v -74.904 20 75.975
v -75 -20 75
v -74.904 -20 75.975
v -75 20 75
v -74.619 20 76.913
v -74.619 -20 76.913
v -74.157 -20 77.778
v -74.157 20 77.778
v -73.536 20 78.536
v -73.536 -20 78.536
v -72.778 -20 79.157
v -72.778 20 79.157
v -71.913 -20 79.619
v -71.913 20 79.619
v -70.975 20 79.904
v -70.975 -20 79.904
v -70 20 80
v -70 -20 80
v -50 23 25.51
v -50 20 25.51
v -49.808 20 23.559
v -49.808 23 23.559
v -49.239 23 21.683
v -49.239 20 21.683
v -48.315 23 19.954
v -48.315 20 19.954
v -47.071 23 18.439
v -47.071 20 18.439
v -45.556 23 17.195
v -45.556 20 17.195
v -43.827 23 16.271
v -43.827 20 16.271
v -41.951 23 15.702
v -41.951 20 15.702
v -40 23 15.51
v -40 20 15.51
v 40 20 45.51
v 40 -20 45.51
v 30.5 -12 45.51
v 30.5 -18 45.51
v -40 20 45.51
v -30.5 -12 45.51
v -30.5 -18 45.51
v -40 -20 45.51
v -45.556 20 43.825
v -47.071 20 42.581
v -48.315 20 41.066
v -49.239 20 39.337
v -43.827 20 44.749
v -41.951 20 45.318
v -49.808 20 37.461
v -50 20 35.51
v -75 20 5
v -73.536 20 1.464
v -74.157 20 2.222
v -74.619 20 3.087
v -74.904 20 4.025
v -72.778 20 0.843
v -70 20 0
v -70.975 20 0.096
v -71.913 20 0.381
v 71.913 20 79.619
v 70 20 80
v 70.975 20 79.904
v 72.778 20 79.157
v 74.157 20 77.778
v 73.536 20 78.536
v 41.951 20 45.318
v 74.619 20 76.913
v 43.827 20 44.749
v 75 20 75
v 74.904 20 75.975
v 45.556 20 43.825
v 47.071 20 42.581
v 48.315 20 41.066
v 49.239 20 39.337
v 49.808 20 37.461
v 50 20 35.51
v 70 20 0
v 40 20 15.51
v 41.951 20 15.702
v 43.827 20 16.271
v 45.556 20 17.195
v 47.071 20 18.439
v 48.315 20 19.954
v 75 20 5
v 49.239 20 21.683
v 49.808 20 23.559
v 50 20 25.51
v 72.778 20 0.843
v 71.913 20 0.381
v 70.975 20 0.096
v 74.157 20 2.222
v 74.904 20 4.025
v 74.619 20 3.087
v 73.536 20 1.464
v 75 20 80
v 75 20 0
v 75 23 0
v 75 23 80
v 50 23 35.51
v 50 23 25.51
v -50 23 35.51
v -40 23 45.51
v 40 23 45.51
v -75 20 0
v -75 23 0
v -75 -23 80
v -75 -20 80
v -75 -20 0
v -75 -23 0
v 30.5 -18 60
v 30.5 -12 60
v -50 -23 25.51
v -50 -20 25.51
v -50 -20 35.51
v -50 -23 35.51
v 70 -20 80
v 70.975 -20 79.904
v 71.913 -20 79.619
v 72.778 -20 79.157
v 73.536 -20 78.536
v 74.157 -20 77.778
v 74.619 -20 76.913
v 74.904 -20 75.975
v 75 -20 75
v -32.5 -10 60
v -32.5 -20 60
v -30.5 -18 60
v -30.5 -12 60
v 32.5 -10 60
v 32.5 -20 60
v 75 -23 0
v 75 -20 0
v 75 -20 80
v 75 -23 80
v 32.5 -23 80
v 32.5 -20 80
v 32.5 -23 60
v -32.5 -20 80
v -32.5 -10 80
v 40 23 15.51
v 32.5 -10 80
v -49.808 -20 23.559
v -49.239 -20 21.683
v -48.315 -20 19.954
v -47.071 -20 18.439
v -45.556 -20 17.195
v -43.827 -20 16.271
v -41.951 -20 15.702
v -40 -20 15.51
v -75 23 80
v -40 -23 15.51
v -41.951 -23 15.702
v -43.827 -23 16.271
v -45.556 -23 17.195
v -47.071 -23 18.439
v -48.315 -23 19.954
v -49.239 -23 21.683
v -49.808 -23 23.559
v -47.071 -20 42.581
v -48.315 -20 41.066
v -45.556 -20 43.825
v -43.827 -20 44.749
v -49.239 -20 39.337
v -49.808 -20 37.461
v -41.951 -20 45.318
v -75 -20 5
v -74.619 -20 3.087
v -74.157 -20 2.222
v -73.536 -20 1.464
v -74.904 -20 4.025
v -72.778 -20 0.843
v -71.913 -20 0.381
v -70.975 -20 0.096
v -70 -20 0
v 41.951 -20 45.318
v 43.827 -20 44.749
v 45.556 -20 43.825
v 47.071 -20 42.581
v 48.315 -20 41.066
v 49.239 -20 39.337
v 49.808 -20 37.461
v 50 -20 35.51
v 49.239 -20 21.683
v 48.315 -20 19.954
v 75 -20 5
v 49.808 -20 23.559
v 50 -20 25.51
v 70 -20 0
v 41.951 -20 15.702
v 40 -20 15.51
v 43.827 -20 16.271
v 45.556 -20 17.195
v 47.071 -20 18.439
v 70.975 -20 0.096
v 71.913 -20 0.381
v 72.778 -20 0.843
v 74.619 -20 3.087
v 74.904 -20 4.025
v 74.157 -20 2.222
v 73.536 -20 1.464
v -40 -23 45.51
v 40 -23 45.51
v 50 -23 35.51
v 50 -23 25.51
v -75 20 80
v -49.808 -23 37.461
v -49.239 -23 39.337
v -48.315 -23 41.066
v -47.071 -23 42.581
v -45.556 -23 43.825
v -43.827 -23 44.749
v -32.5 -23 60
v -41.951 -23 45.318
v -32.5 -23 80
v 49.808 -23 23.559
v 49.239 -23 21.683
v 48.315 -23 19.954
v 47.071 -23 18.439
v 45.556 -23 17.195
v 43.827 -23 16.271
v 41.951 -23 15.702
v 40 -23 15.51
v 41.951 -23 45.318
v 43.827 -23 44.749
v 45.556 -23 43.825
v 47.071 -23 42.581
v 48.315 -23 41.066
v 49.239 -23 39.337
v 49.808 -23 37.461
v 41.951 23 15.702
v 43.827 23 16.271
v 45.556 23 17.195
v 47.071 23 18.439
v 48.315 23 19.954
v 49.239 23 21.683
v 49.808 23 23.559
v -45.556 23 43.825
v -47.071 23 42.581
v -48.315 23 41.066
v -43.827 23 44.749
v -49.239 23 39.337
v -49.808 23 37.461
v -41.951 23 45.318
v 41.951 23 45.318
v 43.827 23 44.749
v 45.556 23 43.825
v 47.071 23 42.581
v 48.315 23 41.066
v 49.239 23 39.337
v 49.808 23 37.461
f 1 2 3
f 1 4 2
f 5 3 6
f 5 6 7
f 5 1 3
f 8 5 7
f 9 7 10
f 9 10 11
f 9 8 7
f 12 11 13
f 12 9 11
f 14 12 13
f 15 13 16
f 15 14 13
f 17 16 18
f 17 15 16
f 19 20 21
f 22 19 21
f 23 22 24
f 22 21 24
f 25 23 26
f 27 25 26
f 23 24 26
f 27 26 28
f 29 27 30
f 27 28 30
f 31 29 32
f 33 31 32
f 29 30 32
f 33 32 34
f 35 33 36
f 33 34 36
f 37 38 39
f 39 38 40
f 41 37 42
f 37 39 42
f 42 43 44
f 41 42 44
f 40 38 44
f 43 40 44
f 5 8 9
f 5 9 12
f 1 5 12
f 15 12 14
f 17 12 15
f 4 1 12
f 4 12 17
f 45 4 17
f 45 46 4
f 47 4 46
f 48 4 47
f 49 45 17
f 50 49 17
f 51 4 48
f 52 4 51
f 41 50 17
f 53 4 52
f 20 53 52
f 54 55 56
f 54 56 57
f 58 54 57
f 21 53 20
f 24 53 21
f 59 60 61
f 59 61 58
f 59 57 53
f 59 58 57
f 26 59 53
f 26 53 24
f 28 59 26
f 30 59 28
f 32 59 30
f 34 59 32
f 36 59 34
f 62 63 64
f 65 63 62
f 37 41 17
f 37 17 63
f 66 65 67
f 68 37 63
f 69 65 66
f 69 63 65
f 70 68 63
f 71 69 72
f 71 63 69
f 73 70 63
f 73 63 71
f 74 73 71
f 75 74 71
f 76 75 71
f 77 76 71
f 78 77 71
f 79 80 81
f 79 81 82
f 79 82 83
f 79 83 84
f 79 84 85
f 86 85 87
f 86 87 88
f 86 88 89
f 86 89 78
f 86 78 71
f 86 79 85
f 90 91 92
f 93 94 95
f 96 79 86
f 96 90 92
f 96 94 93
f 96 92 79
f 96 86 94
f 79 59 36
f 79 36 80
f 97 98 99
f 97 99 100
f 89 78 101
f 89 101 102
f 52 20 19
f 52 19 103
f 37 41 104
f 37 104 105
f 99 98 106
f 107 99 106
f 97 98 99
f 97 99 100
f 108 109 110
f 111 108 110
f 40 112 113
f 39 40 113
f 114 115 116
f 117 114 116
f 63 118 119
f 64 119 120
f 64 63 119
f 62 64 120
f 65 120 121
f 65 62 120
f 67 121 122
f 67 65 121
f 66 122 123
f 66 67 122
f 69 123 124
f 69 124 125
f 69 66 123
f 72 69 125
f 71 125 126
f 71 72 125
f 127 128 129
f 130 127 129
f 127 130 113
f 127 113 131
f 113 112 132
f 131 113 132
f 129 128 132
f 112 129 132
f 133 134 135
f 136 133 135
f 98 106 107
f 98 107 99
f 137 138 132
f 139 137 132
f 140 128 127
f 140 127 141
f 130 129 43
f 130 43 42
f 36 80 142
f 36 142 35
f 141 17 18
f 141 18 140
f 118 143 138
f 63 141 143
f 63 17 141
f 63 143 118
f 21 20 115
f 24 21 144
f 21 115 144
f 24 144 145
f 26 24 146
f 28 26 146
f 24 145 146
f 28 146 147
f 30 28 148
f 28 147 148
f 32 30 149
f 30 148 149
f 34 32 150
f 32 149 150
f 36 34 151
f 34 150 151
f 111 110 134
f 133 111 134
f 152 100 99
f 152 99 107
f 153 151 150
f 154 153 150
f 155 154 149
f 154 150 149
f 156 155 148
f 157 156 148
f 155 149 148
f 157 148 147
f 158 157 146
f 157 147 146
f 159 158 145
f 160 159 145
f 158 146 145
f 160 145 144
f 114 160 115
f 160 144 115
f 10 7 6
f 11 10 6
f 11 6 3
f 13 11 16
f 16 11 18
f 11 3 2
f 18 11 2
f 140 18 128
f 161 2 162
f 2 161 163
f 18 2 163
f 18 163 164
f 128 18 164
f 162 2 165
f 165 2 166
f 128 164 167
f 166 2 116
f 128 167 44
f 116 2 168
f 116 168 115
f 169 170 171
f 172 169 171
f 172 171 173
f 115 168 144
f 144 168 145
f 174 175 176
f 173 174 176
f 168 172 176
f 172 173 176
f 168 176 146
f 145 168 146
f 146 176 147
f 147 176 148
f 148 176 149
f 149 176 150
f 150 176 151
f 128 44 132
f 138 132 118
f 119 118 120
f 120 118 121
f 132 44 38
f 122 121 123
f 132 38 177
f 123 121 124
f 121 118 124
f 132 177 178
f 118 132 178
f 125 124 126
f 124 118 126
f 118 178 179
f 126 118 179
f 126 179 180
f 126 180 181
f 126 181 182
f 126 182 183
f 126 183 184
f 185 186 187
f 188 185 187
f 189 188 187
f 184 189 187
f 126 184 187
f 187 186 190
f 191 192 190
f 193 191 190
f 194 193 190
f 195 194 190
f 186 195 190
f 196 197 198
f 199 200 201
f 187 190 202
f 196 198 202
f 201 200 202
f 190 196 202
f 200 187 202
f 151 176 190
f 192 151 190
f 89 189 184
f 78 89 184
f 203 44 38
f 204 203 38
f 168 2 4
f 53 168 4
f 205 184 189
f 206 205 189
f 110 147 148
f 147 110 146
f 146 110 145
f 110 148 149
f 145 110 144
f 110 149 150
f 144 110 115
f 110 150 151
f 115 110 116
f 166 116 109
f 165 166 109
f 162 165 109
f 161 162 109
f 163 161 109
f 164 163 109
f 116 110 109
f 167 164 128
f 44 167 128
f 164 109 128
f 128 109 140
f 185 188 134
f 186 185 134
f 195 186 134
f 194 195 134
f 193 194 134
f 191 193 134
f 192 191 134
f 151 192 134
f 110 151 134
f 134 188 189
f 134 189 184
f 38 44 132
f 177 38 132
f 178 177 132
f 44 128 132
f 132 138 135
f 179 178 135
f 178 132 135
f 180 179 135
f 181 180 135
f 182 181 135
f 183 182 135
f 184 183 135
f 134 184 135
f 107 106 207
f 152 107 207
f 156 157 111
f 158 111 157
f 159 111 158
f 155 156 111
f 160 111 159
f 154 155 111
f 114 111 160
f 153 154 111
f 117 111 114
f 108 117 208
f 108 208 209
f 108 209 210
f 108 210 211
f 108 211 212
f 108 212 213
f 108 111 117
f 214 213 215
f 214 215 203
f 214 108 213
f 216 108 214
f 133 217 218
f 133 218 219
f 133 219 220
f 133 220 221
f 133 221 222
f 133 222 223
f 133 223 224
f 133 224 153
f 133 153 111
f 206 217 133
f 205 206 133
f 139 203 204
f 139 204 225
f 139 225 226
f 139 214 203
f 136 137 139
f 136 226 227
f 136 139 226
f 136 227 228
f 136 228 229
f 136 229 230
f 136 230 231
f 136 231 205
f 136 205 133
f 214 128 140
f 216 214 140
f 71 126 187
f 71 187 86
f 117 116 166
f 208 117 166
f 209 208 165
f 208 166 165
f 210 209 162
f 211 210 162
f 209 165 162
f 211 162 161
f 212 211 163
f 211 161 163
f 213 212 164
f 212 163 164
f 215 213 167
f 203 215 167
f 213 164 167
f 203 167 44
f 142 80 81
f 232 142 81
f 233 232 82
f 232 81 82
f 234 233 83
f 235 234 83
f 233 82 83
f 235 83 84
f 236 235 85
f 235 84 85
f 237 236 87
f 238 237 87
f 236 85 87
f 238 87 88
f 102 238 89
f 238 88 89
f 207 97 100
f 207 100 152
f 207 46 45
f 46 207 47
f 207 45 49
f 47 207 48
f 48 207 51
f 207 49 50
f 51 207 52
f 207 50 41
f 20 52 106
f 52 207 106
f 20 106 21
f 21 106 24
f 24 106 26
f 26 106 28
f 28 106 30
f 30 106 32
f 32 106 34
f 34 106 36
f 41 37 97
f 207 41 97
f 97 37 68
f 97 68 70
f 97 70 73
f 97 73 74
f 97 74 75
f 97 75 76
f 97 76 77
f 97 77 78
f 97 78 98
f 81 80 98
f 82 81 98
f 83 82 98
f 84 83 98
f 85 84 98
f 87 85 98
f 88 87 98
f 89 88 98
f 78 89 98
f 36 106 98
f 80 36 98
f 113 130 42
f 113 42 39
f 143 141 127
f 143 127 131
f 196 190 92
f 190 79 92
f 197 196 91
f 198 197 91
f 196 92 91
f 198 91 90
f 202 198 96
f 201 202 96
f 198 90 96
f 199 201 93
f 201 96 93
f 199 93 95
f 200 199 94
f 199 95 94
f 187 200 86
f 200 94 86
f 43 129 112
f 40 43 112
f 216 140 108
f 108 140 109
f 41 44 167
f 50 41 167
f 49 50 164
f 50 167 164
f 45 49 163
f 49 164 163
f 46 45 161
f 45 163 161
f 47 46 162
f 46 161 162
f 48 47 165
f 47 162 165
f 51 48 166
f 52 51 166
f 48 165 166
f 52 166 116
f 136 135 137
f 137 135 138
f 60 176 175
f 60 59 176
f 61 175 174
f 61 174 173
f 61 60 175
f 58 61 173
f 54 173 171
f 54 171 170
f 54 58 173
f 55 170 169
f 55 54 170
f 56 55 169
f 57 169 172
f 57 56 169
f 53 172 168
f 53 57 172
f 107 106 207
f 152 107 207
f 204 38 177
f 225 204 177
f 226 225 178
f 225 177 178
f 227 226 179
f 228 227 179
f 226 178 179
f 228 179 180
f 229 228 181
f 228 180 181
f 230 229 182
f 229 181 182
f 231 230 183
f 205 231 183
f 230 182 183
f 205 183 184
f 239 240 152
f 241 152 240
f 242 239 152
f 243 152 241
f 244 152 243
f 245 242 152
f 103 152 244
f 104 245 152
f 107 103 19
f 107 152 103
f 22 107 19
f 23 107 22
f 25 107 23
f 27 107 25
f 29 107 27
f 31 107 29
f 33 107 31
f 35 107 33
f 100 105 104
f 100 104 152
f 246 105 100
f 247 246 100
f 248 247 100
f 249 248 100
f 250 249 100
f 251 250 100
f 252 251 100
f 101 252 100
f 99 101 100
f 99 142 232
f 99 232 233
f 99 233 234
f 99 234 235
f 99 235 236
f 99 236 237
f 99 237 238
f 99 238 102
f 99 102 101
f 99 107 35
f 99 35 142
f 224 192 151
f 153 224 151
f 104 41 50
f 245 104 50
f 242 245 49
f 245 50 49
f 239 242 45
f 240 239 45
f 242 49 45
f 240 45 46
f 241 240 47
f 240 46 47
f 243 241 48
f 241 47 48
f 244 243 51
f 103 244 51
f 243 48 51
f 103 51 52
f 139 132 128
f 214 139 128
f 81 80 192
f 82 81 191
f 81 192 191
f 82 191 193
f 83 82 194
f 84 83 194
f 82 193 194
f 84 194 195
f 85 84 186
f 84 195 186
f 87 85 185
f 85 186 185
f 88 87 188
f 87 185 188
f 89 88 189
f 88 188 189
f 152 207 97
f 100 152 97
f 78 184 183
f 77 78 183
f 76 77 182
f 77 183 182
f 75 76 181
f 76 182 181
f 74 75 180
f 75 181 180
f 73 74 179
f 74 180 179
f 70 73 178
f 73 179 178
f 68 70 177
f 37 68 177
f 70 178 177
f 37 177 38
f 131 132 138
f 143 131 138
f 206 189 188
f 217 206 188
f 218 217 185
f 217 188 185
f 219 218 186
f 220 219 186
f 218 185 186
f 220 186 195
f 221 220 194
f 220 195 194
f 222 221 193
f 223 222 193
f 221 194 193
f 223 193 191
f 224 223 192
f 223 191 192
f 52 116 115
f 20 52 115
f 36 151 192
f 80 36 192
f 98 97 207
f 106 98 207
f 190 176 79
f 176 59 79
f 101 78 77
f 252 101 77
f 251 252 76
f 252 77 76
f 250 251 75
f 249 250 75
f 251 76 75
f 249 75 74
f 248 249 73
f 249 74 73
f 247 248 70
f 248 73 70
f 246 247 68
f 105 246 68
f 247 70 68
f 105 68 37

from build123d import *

# Parameters (mm, degrees)
F0_W      = 150
F0_H      = 40
F1_DEPTH  = 80
F2_W      = 65
F2_H      = 20
F3_DEPTH  = 10
F5_DEPTH  = 153.5
F6_W      = 61
F6_H      = 6
F7_DEPTH  = 36.1
F8_DEPTH  = 39.9
F10_DEPTH = 3
F11_DEPTH = 3
F12_W     = 150
F12_H     = 80
F13_DEPTH = 3
F14_R     = 5
F15_R     = 5
F16_R     = 5
F17_R     = 5


with BuildPart() as f1:
    # F0 (on Top) → F1 (new body)
    with BuildSketch(Plane.XY):
        Rectangle(F0_W, F0_H)
    extrude(amount=F1_DEPTH)

    # F2 (on face) → F3 (cut)
    with BuildSketch(Plane.XZ.offset(20)):
        with Locations((0, 70)):
            Rectangle(F2_W, F2_H)
    extrude(amount=-F3_DEPTH, mode=Mode.SUBTRACT)

    # F4 (on face) → F5 (cut)
    with BuildSketch(Plane.XZ.offset(20)):
        with BuildLine():
            Line((40, 45.5098941895), (-40, 45.5098941895))
            ThreePointArc((-40, 45.5098941895), (-47.0710678119, 42.5809620013), (-50, 35.5098941895))
            Line((-50, 35.5098941895), (-50, 25.5098941895))
            ThreePointArc((-50, 25.5098941895), (-47.0710678119, 18.4388263776), (-40, 15.5098941895))
            Line((-40, 15.5098941895), (40, 15.5098941895))
            ThreePointArc((40, 15.5098941895), (47.0710678119, 18.4388263776), (50, 25.5098941895))
            Line((50, 25.5098941895), (50, 35.5098941895))
            ThreePointArc((50, 35.5098941895), (47.0710678119, 42.5809620013), (40, 45.5098941895))
        make_face()
    extrude(amount=-F5_DEPTH, mode=Mode.SUBTRACT)

    # F6 (on face) → F7 (cut)
    with BuildSketch(Plane.XY.offset(60)):
        with Locations((0, -15)):
            Rectangle(F6_W, F6_H)
    extrude(amount=-F7_DEPTH, mode=Mode.SUBTRACT)

    # F6 (on face) → F8 (cut)
    with BuildSketch(Plane.XY.offset(60)):
        with Locations((0, -15)):
            Rectangle(F6_W, F6_H)
    extrude(amount=-F8_DEPTH, mode=Mode.SUBTRACT)


with BuildPart() as f10:
    # F9 (on face) → F10 (new body)
    with BuildSketch(Plane.XZ.offset(20)):
        Polygon((-75, 80), (-75, 0), (75, 0), (75, 80), (32.5, 80), (32.5, 60), (-32.5, 60), (-32.5, 80), align=None)
        with BuildLine():
            ThreePointArc((40, 45.5098941895), (47.0710678119, 42.5809620013), (50, 35.5098941895))
            Line((50, 35.5098941895), (50, 25.5098941895))
            ThreePointArc((50, 25.5098941895), (47.0710678119, 18.4388263776), (40, 15.5098941895))
            Line((40, 15.5098941895), (-40, 15.5098941895))
            ThreePointArc((-40, 15.5098941895), (-47.0710678119, 18.4388263776), (-50, 25.5098941895))
            Line((-50, 25.5098941895), (-50, 35.5098941895))
            ThreePointArc((-50, 35.5098941895), (-47.0710678119, 42.5809620013), (-40, 45.5098941895))
            Line((-40, 45.5098941895), (40, 45.5098941895))
        make_face(mode=Mode.SUBTRACT)
    extrude(amount=F10_DEPTH)


with BuildPart() as f11:
    # F11 (new): a face of the model
    f11_faces = [f1.part.faces().sort_by_distance(p)[0] for p in [
        (73.3, 20, 40),
    ]]
    extrude(f11_faces, amount=F11_DEPTH)


with BuildPart() as f13:
    # F12 (on face) → F13 (new body)
    with BuildSketch(Plane(origin=(0, 20, 0), x_dir=(-1, 0, 0), z_dir=(0, 1, 0))):
        with Locations((0, 40)):
            Rectangle(F12_W, F12_H)
    extrude(amount=F13_DEPTH)


with BuildPart() as f1_1:
    add(f1.part)

    # F14
    f14_edges = [f1_1.edges().sort_by_distance(p)[0] for p in [
        (-75, 0, 80),
    ]]
    fillet(f14_edges, radius=F14_R)

    # F15
    f15_edges = [f1_1.edges().sort_by_distance(p)[0] for p in [
        (75, 0, 80),
    ]]
    fillet(f15_edges, radius=F15_R)

    # F16
    f16_edges = [f1_1.edges().sort_by_distance(p)[0] for p in [
        (-75, 0, 0),
    ]]
    fillet(f16_edges, radius=F16_R)

    # F17
    f17_edges = [f1_1.edges().sort_by_distance(p)[0] for p in [
        (75, 0, 0),
    ]]
    fillet(f17_edges, radius=F17_R)


solid = Compound([f10.part, f11.part, f13.part, f1_1.part])
